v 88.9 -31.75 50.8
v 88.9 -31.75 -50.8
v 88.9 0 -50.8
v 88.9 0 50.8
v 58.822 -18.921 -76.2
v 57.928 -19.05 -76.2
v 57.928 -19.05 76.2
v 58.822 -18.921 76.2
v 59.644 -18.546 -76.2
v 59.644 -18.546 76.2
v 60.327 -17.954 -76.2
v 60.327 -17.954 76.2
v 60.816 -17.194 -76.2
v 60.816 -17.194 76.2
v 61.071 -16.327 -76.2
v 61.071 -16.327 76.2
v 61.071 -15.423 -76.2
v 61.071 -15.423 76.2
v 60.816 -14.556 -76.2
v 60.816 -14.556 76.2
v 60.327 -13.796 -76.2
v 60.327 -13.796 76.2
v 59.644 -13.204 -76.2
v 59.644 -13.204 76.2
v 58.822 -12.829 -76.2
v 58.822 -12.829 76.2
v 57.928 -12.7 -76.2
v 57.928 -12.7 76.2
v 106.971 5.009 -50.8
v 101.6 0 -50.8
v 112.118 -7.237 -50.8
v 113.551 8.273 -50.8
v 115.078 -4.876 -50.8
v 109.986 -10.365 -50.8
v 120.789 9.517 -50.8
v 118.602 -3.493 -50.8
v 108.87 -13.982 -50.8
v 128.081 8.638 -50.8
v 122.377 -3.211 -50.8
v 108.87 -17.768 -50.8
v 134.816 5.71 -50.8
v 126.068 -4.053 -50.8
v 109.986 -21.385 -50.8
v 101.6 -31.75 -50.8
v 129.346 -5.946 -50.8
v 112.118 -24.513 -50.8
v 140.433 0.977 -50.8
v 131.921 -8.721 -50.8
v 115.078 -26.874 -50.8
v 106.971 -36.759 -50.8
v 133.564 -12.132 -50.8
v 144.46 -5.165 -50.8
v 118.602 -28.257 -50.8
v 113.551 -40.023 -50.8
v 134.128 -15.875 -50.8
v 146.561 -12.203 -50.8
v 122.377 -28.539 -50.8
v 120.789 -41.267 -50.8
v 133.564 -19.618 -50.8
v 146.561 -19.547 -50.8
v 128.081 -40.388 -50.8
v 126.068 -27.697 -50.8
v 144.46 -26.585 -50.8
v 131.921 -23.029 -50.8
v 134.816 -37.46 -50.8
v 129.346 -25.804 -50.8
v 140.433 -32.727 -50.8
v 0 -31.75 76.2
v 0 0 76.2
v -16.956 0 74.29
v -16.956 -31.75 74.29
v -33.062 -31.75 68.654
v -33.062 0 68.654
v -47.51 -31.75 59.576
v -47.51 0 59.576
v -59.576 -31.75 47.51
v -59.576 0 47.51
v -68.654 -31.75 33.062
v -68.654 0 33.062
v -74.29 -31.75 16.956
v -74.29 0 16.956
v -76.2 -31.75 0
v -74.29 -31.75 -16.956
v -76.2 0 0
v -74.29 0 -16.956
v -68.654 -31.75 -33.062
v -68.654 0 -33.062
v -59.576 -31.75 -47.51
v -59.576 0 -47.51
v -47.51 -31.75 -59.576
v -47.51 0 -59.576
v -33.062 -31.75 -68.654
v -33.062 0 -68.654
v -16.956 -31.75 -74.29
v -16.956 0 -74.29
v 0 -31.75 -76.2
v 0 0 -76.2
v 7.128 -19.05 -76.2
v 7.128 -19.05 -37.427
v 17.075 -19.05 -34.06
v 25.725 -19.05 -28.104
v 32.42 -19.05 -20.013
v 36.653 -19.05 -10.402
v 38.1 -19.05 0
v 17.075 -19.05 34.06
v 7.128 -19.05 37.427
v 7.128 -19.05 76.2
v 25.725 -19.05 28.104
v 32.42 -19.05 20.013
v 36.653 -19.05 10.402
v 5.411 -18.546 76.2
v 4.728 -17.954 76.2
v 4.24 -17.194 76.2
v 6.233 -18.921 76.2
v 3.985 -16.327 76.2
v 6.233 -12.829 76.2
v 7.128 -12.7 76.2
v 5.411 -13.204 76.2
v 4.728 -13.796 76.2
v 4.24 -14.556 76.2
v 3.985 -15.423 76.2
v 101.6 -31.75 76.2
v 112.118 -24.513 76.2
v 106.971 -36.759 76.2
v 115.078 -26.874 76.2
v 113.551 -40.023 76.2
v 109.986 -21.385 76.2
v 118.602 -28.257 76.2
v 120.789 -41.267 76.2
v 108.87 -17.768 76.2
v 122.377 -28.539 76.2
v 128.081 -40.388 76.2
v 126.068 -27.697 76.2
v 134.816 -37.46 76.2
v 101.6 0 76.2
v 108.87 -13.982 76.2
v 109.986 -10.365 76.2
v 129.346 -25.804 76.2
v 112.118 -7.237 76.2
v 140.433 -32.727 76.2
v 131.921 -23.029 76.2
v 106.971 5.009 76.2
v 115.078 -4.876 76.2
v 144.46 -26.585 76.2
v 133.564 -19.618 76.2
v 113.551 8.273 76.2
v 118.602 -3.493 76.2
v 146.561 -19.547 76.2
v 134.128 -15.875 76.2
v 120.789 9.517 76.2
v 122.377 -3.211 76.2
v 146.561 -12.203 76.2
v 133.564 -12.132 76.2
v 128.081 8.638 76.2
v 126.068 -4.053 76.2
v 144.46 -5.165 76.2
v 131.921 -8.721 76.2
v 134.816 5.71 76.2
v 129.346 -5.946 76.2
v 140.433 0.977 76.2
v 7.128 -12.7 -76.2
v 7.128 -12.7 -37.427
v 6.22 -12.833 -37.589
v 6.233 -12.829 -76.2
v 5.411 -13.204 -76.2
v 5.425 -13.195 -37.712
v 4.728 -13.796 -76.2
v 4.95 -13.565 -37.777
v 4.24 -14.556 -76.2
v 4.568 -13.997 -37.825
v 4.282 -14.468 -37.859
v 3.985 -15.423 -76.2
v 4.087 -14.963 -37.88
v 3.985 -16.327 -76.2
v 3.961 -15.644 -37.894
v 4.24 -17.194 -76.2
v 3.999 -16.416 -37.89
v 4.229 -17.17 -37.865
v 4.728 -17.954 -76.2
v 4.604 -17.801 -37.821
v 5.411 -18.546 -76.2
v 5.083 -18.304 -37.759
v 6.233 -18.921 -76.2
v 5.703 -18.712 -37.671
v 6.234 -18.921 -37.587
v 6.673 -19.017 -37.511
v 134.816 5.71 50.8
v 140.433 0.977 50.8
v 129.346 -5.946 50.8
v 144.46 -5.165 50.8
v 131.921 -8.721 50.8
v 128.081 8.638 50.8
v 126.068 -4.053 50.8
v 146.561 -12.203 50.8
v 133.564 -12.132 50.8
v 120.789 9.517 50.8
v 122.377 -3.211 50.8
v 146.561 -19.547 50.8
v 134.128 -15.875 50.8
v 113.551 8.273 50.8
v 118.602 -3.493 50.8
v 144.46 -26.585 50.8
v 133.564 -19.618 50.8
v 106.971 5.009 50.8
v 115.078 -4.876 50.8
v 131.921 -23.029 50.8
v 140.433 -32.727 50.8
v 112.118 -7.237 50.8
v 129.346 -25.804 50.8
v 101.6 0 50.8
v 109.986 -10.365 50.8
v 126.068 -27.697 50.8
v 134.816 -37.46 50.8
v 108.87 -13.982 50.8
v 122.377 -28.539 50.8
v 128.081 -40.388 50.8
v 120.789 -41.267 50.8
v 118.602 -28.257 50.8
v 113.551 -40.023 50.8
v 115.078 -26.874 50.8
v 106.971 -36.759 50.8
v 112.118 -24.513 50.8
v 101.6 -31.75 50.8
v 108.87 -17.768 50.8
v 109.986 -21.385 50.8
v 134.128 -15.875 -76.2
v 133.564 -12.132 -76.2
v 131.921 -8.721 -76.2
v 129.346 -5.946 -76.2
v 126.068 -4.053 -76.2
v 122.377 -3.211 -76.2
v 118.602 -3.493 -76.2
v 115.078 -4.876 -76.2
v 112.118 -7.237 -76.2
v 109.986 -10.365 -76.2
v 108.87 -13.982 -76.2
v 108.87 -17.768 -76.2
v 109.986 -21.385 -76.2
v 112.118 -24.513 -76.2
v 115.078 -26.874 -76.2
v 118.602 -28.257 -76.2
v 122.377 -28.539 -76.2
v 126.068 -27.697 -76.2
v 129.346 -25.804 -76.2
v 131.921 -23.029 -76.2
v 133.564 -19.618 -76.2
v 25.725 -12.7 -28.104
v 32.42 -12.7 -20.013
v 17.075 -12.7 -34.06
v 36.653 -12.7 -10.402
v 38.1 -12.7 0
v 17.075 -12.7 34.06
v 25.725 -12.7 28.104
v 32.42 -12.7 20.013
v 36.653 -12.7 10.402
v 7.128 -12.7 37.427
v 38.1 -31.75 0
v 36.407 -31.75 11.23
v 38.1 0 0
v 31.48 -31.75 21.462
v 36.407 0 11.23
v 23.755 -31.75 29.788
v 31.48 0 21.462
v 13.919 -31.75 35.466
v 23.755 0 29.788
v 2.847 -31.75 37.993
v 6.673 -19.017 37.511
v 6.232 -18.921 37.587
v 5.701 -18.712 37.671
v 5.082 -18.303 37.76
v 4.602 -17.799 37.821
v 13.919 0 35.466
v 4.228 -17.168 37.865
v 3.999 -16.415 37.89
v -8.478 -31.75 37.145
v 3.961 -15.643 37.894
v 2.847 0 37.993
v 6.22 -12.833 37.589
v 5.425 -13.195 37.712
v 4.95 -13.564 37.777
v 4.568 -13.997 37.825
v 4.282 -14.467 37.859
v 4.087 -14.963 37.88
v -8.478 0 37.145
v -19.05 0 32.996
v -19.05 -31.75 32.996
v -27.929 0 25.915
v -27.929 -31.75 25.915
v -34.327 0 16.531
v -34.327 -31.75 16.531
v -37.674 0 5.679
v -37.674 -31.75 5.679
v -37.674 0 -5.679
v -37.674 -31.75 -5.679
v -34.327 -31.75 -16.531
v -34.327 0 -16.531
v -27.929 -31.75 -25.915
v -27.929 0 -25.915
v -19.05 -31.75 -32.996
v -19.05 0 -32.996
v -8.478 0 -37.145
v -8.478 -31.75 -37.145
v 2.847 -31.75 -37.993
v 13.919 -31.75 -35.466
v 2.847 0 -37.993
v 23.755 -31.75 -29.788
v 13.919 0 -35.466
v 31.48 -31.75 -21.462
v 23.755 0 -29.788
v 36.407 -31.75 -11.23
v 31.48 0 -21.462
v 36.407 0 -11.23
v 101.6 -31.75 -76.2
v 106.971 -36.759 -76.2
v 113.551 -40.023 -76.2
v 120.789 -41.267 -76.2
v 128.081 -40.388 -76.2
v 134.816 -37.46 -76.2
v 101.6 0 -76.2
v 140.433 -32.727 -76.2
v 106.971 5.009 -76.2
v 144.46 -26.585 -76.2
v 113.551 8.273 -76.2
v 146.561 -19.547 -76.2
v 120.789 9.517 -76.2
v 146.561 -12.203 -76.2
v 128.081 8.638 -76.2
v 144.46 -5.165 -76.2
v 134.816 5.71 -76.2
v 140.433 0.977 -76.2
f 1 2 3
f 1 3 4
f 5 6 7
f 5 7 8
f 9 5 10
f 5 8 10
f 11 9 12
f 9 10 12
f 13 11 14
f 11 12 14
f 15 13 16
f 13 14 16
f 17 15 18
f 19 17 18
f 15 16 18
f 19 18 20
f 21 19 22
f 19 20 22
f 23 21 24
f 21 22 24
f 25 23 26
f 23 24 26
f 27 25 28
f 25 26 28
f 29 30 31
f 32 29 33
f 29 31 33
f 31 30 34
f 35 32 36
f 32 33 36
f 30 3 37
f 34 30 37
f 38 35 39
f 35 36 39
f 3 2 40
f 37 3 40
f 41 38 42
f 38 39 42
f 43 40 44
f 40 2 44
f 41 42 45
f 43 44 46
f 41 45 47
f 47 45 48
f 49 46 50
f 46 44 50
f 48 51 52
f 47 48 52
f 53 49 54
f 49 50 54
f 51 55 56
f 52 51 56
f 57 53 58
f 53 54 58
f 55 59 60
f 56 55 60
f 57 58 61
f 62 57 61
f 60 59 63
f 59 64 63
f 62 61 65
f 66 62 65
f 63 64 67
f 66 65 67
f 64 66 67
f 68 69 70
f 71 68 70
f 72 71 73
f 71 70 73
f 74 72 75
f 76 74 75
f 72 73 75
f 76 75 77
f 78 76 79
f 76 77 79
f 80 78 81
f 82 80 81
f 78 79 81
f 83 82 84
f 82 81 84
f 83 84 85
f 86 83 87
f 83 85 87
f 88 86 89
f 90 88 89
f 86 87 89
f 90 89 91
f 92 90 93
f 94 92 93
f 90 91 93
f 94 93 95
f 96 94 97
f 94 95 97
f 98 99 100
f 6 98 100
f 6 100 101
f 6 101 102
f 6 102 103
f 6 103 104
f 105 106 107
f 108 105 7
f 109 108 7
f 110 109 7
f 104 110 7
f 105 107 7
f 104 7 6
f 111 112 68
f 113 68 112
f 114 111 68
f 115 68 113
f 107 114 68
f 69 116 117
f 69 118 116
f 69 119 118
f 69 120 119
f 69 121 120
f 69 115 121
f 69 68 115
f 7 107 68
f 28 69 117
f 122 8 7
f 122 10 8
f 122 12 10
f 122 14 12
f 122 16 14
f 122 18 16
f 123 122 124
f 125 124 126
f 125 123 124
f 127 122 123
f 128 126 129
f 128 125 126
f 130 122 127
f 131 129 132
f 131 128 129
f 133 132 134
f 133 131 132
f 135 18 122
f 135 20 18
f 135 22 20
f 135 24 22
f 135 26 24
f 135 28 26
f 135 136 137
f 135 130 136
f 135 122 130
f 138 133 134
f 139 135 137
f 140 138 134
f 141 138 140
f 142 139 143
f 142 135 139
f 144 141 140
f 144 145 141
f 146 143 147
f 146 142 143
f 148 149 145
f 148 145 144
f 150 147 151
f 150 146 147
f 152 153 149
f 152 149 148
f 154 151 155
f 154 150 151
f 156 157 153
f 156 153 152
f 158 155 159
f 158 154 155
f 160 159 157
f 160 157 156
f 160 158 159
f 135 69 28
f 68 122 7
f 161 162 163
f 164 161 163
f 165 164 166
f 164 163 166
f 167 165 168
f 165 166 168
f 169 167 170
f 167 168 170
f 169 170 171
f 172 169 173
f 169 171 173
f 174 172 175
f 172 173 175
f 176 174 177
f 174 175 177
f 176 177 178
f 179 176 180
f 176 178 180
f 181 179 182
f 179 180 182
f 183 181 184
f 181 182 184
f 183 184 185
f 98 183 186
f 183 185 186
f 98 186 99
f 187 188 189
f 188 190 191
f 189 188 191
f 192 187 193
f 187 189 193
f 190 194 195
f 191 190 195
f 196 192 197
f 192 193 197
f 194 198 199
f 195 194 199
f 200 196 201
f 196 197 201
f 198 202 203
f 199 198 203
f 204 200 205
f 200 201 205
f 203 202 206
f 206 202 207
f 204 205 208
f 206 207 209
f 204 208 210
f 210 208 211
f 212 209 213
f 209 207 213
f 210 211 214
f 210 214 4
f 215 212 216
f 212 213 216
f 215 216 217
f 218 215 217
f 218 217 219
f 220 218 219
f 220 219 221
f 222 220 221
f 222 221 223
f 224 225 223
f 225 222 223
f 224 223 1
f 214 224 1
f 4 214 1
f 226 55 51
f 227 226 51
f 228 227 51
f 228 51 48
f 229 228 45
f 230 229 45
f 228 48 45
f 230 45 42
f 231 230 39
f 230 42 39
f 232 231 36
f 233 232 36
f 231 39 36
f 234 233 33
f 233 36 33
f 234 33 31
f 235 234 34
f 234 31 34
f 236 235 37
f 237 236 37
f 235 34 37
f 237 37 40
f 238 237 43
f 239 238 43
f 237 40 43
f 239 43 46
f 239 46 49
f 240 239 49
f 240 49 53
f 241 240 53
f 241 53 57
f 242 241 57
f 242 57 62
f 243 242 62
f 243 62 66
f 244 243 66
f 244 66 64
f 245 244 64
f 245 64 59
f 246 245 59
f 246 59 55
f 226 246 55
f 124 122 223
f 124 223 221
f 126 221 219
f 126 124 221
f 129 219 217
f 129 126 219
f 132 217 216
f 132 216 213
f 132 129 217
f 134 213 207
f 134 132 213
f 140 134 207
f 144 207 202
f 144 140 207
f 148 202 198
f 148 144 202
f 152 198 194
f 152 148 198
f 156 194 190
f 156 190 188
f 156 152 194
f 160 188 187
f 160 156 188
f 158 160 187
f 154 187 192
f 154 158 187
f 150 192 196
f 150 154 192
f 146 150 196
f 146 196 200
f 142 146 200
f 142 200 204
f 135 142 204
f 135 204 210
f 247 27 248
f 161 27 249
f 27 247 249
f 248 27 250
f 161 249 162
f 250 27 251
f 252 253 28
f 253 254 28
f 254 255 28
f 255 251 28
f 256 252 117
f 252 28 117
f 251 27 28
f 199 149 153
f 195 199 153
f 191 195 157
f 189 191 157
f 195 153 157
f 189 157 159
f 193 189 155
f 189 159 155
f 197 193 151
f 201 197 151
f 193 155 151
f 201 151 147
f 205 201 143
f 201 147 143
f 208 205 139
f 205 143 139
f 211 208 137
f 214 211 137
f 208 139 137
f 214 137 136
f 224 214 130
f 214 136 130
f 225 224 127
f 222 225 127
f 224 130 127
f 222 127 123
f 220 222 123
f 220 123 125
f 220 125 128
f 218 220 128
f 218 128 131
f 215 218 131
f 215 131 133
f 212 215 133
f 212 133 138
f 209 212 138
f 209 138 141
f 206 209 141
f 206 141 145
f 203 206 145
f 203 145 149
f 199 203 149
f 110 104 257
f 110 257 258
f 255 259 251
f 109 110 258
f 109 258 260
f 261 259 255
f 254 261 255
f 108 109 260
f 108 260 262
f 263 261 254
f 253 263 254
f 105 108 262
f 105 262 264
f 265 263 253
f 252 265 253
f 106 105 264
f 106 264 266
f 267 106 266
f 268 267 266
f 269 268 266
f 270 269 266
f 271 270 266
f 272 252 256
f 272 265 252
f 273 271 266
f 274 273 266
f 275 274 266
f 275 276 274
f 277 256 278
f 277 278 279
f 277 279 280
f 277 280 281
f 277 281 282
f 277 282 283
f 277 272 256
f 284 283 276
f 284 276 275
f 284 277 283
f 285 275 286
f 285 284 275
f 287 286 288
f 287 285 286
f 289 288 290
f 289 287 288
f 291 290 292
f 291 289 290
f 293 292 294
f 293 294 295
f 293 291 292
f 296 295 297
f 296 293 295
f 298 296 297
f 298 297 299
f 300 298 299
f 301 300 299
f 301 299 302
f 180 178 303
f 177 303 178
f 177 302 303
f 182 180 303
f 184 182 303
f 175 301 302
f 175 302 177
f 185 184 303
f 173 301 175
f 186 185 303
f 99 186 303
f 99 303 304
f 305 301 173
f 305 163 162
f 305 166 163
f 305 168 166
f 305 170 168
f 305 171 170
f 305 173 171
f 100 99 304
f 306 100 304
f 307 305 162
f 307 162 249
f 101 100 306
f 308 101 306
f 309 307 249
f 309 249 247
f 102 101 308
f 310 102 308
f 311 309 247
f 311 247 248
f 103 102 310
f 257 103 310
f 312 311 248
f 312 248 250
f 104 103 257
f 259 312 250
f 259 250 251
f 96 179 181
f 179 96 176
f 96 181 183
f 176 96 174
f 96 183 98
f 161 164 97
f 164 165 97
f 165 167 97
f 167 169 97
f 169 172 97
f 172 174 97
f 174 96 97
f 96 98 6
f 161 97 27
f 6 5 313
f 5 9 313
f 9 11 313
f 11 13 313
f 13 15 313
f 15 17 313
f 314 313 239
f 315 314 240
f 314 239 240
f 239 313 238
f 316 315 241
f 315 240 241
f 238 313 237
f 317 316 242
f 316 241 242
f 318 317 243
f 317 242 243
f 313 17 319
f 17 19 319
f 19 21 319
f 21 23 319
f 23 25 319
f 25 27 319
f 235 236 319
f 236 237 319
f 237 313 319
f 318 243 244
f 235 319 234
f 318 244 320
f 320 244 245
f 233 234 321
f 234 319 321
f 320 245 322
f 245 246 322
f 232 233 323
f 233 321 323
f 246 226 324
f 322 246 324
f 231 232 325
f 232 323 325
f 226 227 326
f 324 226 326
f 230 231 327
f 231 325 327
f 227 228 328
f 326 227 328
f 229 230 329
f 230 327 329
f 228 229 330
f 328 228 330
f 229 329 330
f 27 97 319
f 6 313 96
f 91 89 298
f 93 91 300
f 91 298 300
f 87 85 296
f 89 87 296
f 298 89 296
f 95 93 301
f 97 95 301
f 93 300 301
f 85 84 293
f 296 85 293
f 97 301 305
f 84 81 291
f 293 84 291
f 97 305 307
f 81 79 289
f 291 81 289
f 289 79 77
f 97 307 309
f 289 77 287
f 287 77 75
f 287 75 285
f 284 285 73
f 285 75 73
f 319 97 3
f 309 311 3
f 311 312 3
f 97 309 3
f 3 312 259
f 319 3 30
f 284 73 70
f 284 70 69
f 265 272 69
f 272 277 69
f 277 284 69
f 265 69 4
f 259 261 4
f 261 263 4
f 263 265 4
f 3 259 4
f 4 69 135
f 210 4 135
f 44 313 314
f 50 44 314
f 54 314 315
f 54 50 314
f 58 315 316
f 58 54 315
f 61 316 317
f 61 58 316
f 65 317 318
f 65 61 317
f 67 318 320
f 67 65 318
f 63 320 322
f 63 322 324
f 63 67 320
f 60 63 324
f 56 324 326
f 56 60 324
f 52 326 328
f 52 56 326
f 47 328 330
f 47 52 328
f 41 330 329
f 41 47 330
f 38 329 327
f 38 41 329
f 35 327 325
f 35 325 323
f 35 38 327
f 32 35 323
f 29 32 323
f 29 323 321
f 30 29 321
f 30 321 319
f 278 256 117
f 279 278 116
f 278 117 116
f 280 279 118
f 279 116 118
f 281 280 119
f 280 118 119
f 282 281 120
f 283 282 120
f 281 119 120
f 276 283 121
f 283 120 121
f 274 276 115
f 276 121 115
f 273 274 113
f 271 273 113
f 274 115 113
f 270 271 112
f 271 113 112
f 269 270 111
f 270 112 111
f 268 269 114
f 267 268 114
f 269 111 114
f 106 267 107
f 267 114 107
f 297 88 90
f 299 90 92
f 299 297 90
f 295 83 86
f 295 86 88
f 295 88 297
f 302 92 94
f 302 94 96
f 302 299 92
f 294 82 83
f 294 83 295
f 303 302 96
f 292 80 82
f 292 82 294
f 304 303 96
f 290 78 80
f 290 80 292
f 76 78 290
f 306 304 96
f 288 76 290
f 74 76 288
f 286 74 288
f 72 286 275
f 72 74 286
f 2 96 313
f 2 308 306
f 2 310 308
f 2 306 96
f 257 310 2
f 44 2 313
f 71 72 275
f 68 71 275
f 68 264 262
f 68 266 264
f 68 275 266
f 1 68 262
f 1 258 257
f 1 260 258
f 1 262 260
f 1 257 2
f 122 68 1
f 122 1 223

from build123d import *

# Parameters (mm, degrees)
F0_R     = 38.1
F1_DEPTH = 31.75
F2_R     = 12.7
F3_DEPTH = 152.4
F4_W     = 38.1
F4_H     = 101.6
F4_W_2   = 75.343641
F5_DEPTH = 63.5
F7_DEPTH = 152.401


with BuildPart() as f1:
    # F0 (on Front) → F1 (new body)
    with BuildSketch(Plane.XZ):
        with BuildLine():
            ThreePointArc((0, -76.2), (53.881537, -53.881537), (76.2, 0))
            ThreePointArc((76.2, 0), (53.881537, 53.881537), (0, 76.2))
            ThreePointArc((0, 76.2), (-76.2, 0), (0, -76.2))
        make_face()
        Circle(F0_R, mode=Mode.SUBTRACT)
        with BuildLine():
            ThreePointArc((0, 76.2), (53.881537, 53.881537), (76.2, 0))
            ThreePointArc((76.2, 0), (53.881537, -53.881537), (0, -76.2))
            Line((0, -76.2), (101.6, -76.2))
            Line((101.6, -76.2), (101.6, 76.2))
            Line((101.6, 76.2), (0, 76.2))
        make_face()
    extrude(amount=F1_DEPTH)

    # F2 (on face) → F3 (join)
    with BuildSketch(Plane.XY.offset(76.2)):
        with BuildLine():
            Line((101.6, 0), (101.6, -31.75))
            ThreePointArc((101.6, -31.75), (146.827869, -15.875), (101.6, 0))
        make_face()
        with Locations((121.427869, -15.875)):
            Circle(F2_R, mode=Mode.SUBTRACT)
    extrude(amount=-F3_DEPTH)

    # F4 (on face) → F5 (cut, symmetric)
    with BuildSketch(Plane.XZ.offset(31.75)):
        with Locations((107.95, 0)):
            Rectangle(F4_W, F4_H)
        with Locations((164.67182, 0)):
            Rectangle(F4_W_2, F4_H)
    extrude(amount=F5_DEPTH, both=True, mode=Mode.SUBTRACT)

    # F6 (on face) → F7 (cut, through all)
    with BuildSketch(Plane.XY.offset(76.2)):
        with BuildLine():
            Line((7.127869, -19.05), (57.927869, -19.05))
            ThreePointArc((57.927869, -19.05), (61.102869, -15.875), (57.927869, -12.7))
            Line((57.927869, -12.7), (7.127869, -12.7))
            ThreePointArc((7.127869, -12.7), (3.952869, -15.875), (7.127869, -19.05))
        make_face()
    extrude(amount=-F7_DEPTH, mode=Mode.SUBTRACT)


solid = f1.part
